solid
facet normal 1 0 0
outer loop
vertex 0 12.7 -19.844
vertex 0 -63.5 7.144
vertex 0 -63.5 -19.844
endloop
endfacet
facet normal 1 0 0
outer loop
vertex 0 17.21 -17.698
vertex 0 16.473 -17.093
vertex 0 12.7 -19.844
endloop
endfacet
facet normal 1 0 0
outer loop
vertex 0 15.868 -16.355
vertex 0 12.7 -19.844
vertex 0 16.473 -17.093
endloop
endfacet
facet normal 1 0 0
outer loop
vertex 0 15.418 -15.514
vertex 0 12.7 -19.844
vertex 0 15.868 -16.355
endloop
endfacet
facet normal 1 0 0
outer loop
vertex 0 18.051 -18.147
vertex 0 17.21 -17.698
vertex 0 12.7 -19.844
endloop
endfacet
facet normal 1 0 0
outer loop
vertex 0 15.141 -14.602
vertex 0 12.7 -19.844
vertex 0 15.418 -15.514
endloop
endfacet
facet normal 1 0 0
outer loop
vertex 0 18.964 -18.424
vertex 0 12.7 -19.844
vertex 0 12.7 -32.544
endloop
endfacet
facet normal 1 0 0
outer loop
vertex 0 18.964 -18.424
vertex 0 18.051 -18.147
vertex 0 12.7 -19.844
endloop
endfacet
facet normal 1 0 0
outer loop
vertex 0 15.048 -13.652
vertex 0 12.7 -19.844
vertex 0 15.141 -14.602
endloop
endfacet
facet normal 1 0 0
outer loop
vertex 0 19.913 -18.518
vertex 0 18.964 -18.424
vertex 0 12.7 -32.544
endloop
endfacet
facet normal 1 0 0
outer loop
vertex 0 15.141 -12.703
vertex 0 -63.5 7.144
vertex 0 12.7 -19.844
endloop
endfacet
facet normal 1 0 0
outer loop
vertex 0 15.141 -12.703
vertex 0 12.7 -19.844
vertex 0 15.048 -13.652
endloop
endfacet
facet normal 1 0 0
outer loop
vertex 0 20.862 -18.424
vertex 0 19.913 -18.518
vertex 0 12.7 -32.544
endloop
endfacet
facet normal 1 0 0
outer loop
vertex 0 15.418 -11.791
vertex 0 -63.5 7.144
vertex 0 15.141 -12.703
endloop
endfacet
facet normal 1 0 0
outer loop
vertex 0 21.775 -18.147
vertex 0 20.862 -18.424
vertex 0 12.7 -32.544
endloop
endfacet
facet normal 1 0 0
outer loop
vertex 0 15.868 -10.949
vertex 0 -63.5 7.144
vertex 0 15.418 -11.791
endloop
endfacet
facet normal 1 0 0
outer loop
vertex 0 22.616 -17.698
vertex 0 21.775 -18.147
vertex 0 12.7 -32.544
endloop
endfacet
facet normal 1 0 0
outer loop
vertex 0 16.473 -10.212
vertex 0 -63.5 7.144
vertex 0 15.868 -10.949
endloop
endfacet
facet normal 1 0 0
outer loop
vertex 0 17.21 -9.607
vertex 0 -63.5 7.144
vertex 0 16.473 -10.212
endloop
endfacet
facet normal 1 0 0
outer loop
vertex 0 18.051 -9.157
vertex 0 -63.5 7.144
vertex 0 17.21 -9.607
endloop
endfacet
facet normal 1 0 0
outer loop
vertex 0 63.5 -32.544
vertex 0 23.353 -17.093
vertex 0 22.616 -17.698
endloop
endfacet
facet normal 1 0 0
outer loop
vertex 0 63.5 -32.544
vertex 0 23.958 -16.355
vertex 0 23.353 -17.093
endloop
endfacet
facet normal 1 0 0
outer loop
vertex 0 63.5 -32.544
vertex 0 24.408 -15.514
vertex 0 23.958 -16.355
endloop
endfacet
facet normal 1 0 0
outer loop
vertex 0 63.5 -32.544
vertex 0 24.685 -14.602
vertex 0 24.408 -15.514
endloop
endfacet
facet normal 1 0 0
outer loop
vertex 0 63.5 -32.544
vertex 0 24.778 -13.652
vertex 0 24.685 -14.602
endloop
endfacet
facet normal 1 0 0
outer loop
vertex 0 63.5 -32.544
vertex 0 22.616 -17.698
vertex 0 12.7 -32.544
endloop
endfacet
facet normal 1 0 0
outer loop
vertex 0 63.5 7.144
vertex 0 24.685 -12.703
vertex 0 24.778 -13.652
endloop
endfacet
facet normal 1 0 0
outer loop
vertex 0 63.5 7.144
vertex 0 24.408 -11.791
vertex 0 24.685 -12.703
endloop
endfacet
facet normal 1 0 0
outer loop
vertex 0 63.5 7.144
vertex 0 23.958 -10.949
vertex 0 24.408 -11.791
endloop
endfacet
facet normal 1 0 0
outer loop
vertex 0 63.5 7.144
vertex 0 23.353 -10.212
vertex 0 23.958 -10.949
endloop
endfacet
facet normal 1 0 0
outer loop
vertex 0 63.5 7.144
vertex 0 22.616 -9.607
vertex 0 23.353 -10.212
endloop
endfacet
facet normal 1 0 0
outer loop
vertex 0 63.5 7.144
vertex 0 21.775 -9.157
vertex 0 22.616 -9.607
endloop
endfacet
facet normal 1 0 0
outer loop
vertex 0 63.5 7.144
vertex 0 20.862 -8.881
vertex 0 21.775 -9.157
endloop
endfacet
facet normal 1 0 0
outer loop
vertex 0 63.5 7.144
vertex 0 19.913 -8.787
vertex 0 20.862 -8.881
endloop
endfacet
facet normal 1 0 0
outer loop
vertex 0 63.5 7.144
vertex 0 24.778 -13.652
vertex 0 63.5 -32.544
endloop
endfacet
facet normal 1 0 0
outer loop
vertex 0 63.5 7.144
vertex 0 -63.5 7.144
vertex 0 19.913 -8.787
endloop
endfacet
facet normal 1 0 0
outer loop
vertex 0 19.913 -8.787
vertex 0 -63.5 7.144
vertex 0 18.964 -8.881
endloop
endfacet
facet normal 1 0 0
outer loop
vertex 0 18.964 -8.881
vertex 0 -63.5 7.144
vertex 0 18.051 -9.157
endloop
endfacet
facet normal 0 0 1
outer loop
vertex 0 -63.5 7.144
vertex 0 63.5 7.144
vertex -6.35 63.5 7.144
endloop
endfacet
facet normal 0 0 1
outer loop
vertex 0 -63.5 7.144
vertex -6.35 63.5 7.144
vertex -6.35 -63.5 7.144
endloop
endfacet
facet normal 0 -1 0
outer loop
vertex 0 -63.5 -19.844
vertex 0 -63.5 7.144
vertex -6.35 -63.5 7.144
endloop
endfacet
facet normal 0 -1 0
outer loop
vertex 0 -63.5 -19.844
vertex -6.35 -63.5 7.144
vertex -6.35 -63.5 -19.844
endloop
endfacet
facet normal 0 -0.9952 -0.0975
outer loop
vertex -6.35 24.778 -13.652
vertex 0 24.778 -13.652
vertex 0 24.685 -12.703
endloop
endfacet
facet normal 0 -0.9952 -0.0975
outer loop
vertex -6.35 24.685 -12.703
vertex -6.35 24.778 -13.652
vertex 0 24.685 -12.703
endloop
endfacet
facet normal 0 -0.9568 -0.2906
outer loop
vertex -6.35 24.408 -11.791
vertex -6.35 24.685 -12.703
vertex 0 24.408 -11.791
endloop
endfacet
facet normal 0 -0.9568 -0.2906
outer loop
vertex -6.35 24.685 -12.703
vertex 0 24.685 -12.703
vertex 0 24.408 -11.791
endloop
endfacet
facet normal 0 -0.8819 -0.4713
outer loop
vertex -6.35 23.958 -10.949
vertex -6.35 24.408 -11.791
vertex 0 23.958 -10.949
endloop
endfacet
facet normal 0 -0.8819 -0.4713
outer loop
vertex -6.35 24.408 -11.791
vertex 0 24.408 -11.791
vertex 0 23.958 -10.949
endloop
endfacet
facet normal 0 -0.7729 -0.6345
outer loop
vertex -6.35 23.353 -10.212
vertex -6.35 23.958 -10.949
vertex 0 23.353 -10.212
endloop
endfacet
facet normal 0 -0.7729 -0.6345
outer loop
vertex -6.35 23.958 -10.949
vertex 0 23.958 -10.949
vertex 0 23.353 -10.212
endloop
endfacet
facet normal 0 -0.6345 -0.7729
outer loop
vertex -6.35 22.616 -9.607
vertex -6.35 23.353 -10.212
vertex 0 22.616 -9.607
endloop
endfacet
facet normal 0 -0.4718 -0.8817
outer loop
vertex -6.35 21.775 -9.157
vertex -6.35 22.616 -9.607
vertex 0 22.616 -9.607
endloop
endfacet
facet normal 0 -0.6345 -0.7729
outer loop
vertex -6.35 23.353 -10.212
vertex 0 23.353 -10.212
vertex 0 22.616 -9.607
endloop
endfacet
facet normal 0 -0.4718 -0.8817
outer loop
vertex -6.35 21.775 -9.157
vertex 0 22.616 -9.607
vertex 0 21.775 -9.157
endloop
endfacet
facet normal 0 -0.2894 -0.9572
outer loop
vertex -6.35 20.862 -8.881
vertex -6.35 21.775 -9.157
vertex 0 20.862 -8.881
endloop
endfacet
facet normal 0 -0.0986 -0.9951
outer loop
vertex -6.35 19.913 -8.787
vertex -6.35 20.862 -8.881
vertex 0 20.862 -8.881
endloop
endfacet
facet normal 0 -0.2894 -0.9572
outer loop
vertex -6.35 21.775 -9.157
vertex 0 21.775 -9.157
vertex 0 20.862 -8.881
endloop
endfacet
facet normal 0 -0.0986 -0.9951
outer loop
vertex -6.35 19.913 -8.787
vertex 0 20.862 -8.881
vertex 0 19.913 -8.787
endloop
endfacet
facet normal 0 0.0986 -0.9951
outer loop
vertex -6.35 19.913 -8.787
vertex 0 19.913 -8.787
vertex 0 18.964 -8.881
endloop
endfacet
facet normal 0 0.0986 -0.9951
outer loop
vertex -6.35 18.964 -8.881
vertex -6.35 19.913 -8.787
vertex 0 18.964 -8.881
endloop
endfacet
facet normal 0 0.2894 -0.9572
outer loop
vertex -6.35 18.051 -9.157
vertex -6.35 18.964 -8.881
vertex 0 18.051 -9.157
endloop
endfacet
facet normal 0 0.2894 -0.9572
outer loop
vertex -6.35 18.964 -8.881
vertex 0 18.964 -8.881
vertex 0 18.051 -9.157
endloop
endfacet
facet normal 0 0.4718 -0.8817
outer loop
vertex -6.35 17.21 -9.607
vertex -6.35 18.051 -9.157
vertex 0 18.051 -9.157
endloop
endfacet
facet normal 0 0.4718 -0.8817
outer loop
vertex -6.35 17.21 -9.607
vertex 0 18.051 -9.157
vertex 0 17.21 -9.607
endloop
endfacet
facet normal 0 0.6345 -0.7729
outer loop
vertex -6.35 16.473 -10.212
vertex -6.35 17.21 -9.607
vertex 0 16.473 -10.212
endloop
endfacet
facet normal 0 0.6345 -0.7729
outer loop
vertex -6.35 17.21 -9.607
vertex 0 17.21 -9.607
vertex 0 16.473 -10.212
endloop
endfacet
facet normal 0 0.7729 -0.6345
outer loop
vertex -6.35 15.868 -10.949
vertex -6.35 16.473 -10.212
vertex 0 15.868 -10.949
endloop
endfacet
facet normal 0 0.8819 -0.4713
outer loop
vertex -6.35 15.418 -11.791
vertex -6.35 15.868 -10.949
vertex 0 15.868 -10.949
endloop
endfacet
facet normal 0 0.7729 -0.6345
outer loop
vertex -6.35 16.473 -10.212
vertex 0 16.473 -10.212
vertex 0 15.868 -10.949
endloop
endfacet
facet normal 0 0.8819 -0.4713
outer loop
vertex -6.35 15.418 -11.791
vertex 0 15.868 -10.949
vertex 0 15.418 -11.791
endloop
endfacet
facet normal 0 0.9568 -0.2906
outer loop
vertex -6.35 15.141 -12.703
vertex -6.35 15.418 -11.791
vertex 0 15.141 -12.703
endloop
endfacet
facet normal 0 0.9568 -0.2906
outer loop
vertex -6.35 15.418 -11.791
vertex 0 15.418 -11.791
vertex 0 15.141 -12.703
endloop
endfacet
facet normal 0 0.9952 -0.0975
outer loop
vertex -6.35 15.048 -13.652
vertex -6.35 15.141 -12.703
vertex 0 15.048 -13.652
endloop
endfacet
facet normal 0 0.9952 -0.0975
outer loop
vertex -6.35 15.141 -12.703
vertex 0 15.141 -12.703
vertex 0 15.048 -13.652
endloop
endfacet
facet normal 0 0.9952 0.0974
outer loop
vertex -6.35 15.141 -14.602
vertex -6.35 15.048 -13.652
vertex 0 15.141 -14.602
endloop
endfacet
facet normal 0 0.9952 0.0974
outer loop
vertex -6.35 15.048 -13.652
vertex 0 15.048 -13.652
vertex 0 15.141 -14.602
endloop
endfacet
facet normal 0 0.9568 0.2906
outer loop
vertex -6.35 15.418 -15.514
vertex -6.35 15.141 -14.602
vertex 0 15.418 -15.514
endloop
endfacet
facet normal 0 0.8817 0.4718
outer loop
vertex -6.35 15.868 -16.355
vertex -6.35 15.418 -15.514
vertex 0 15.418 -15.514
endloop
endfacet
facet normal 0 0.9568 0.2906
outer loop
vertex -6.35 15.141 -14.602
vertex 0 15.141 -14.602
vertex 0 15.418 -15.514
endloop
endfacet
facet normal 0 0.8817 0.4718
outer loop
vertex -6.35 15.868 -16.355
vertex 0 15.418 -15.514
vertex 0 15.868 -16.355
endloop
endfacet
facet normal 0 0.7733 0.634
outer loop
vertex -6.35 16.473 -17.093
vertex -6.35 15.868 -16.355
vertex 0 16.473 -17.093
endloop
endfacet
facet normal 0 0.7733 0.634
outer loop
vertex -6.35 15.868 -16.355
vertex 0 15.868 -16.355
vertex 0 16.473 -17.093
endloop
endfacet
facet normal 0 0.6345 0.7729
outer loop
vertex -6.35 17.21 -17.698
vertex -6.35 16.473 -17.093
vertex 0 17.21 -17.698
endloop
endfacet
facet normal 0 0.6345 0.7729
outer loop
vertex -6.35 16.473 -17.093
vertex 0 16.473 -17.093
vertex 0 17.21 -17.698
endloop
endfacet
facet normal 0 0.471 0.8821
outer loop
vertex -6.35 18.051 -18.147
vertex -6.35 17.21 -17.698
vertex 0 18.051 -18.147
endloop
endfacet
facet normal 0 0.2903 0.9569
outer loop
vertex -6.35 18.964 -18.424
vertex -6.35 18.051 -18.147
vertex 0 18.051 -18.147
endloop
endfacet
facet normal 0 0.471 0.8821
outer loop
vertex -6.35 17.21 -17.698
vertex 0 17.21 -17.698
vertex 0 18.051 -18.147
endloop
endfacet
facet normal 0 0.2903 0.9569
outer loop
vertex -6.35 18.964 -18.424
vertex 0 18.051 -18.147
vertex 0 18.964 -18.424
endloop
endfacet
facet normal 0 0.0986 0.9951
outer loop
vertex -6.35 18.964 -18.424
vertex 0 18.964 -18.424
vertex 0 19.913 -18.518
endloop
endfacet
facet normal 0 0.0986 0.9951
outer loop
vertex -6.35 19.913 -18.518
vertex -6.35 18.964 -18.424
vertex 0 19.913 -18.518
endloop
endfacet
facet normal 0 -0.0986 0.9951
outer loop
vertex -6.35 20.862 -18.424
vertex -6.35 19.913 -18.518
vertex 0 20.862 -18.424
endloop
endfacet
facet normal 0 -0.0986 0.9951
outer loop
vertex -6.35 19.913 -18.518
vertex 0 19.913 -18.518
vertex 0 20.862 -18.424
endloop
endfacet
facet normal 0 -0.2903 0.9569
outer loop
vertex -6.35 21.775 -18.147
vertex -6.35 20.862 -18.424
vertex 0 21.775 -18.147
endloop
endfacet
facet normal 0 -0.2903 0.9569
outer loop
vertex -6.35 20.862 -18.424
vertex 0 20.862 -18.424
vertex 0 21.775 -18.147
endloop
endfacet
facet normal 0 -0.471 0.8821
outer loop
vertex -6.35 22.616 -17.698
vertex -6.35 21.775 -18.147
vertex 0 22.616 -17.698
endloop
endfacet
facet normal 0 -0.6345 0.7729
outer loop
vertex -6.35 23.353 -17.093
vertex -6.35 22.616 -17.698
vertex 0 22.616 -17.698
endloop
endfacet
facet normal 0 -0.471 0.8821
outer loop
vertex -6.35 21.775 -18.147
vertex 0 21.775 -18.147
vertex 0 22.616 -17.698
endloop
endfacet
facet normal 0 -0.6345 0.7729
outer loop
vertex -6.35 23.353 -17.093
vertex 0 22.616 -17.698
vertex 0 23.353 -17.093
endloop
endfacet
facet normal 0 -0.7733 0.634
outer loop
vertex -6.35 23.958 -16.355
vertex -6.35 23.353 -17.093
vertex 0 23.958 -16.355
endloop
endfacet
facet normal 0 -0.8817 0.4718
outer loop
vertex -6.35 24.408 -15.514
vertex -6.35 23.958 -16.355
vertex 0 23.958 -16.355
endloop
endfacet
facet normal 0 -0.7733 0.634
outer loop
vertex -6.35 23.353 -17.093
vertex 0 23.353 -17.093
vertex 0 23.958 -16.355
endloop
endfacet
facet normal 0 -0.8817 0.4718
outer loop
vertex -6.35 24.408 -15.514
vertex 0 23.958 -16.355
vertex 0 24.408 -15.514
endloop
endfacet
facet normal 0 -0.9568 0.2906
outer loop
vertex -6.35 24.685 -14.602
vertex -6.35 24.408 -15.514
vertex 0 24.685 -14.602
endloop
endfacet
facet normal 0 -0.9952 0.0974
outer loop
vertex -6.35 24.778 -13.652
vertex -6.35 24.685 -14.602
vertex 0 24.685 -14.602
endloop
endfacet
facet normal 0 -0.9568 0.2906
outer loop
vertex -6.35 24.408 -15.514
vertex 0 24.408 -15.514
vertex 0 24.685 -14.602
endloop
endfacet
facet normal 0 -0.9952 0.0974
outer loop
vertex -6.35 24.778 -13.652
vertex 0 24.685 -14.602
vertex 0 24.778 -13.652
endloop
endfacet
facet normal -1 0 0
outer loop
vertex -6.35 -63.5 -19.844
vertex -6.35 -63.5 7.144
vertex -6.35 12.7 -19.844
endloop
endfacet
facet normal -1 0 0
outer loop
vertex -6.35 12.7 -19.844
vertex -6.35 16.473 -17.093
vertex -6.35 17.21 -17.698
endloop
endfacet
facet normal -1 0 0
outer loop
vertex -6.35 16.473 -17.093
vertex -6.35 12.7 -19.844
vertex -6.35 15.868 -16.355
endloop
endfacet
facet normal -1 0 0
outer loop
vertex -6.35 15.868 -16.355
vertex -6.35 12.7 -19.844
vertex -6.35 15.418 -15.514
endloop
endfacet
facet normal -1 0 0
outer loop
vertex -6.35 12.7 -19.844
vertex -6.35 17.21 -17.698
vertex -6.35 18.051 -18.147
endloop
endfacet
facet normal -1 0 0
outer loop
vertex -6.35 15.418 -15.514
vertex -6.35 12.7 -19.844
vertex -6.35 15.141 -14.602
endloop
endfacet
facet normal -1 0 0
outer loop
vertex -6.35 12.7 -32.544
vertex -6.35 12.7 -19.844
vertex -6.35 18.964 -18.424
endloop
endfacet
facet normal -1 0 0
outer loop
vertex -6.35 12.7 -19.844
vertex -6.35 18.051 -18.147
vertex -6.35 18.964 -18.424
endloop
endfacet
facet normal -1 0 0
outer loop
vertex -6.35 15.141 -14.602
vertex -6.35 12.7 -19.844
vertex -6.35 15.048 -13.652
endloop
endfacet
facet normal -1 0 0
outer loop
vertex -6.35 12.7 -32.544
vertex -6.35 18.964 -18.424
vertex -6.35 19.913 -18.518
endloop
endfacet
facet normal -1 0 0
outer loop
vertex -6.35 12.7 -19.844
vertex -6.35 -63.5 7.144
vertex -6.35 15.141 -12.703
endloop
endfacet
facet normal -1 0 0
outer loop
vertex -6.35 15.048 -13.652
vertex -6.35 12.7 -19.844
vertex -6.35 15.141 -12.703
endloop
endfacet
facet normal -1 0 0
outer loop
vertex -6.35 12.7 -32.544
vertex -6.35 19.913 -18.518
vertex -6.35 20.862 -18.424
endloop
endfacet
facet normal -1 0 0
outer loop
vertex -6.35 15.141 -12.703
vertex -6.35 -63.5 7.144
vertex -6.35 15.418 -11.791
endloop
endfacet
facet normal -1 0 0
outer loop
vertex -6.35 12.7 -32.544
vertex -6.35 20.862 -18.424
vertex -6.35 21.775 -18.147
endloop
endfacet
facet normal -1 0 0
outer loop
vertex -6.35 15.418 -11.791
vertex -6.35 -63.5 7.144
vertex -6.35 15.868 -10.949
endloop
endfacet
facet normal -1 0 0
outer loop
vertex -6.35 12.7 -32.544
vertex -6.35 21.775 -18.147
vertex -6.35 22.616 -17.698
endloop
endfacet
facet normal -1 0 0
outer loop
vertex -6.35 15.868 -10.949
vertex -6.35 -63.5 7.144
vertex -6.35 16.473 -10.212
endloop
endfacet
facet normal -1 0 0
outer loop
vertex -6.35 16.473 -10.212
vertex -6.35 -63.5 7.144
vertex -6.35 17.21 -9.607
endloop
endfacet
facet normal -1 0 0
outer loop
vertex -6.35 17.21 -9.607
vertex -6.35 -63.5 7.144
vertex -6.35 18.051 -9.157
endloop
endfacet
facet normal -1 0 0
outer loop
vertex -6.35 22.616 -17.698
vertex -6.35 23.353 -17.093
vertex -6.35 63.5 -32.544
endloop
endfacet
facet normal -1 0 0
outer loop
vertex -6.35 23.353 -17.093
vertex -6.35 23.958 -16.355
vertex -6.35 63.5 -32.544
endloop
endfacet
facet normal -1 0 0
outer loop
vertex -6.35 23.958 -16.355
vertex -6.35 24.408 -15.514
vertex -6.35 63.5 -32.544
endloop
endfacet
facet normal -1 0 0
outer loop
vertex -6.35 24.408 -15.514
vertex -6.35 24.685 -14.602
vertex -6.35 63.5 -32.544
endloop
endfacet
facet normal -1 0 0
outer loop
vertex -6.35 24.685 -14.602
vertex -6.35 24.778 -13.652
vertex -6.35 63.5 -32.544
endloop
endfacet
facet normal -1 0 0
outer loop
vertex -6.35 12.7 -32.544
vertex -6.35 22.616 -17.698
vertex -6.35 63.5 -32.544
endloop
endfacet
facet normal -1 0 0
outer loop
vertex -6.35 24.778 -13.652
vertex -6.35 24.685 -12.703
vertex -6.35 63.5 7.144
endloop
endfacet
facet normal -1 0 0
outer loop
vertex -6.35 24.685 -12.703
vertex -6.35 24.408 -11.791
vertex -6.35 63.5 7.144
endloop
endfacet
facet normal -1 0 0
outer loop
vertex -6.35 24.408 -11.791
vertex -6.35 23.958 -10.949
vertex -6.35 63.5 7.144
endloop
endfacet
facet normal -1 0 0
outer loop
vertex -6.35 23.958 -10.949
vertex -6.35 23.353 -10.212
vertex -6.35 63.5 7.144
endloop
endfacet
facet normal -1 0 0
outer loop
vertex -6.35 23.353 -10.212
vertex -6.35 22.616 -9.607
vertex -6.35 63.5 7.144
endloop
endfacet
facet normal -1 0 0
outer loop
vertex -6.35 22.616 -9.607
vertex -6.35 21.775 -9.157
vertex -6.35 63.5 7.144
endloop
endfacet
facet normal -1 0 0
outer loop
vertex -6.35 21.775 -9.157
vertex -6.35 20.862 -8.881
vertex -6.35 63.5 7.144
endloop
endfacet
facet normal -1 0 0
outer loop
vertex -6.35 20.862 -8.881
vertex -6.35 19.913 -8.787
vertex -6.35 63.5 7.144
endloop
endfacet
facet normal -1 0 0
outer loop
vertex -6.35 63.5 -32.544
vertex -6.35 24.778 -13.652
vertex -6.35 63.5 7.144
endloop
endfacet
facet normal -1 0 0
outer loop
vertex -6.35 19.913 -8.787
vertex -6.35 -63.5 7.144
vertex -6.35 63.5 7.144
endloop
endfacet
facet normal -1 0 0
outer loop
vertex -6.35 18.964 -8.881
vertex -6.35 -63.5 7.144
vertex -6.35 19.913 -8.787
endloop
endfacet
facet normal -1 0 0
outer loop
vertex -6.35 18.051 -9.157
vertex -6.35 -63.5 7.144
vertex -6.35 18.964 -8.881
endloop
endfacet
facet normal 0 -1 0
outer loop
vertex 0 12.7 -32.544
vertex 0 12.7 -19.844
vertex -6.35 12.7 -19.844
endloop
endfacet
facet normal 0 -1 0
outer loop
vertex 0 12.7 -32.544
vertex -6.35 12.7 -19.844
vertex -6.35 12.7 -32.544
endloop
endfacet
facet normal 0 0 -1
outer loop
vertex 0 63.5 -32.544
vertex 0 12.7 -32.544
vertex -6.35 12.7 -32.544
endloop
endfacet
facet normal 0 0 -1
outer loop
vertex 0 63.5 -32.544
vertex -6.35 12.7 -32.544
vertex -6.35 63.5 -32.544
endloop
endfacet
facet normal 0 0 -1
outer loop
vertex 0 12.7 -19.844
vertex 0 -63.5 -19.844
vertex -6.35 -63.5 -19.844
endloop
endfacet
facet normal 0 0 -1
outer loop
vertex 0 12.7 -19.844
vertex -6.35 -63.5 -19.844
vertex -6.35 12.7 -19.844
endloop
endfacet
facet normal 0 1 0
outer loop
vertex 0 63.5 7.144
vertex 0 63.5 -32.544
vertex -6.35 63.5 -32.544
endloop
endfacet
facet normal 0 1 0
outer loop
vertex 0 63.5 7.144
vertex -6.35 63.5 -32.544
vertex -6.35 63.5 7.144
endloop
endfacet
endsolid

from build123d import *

# Parameters (mm, degrees)
F0_R     = 4.8652202412
F0_W     = 76.2
F0_H     = 12.7
F1_DEPTH = 6.35


# Not quite as in the source:
# - a length typed as a fraction of an inch, garbled in the dataset ("3 / 203.2 mm" for 3/8 in), is restored
# - a feature names something its author has since deleted; it is built from what else it names


with BuildPart() as f1:
    # F0 (on Right) → F1 (new body)
    with BuildSketch(Plane.YZ):
        Polygon((63.5, 7.14375), (-63.5, 7.14375), (-63.5, -7.14375), (12.7, -7.14375), (63.5, -7.14375), align=None)
        Polygon((63.5, -32.54375), (63.5, -7.14375), (12.7, -7.14375), (12.7, -19.84375), (12.7, -32.54375), align=None)
        with Locations((19.9129190296, -13.6523451656)):
            Circle(F0_R, mode=Mode.SUBTRACT)
        with Locations((-25.4, -13.49375)):
            Rectangle(F0_W, F0_H)
    extrude(amount=-F1_DEPTH)


solid = f1.part
